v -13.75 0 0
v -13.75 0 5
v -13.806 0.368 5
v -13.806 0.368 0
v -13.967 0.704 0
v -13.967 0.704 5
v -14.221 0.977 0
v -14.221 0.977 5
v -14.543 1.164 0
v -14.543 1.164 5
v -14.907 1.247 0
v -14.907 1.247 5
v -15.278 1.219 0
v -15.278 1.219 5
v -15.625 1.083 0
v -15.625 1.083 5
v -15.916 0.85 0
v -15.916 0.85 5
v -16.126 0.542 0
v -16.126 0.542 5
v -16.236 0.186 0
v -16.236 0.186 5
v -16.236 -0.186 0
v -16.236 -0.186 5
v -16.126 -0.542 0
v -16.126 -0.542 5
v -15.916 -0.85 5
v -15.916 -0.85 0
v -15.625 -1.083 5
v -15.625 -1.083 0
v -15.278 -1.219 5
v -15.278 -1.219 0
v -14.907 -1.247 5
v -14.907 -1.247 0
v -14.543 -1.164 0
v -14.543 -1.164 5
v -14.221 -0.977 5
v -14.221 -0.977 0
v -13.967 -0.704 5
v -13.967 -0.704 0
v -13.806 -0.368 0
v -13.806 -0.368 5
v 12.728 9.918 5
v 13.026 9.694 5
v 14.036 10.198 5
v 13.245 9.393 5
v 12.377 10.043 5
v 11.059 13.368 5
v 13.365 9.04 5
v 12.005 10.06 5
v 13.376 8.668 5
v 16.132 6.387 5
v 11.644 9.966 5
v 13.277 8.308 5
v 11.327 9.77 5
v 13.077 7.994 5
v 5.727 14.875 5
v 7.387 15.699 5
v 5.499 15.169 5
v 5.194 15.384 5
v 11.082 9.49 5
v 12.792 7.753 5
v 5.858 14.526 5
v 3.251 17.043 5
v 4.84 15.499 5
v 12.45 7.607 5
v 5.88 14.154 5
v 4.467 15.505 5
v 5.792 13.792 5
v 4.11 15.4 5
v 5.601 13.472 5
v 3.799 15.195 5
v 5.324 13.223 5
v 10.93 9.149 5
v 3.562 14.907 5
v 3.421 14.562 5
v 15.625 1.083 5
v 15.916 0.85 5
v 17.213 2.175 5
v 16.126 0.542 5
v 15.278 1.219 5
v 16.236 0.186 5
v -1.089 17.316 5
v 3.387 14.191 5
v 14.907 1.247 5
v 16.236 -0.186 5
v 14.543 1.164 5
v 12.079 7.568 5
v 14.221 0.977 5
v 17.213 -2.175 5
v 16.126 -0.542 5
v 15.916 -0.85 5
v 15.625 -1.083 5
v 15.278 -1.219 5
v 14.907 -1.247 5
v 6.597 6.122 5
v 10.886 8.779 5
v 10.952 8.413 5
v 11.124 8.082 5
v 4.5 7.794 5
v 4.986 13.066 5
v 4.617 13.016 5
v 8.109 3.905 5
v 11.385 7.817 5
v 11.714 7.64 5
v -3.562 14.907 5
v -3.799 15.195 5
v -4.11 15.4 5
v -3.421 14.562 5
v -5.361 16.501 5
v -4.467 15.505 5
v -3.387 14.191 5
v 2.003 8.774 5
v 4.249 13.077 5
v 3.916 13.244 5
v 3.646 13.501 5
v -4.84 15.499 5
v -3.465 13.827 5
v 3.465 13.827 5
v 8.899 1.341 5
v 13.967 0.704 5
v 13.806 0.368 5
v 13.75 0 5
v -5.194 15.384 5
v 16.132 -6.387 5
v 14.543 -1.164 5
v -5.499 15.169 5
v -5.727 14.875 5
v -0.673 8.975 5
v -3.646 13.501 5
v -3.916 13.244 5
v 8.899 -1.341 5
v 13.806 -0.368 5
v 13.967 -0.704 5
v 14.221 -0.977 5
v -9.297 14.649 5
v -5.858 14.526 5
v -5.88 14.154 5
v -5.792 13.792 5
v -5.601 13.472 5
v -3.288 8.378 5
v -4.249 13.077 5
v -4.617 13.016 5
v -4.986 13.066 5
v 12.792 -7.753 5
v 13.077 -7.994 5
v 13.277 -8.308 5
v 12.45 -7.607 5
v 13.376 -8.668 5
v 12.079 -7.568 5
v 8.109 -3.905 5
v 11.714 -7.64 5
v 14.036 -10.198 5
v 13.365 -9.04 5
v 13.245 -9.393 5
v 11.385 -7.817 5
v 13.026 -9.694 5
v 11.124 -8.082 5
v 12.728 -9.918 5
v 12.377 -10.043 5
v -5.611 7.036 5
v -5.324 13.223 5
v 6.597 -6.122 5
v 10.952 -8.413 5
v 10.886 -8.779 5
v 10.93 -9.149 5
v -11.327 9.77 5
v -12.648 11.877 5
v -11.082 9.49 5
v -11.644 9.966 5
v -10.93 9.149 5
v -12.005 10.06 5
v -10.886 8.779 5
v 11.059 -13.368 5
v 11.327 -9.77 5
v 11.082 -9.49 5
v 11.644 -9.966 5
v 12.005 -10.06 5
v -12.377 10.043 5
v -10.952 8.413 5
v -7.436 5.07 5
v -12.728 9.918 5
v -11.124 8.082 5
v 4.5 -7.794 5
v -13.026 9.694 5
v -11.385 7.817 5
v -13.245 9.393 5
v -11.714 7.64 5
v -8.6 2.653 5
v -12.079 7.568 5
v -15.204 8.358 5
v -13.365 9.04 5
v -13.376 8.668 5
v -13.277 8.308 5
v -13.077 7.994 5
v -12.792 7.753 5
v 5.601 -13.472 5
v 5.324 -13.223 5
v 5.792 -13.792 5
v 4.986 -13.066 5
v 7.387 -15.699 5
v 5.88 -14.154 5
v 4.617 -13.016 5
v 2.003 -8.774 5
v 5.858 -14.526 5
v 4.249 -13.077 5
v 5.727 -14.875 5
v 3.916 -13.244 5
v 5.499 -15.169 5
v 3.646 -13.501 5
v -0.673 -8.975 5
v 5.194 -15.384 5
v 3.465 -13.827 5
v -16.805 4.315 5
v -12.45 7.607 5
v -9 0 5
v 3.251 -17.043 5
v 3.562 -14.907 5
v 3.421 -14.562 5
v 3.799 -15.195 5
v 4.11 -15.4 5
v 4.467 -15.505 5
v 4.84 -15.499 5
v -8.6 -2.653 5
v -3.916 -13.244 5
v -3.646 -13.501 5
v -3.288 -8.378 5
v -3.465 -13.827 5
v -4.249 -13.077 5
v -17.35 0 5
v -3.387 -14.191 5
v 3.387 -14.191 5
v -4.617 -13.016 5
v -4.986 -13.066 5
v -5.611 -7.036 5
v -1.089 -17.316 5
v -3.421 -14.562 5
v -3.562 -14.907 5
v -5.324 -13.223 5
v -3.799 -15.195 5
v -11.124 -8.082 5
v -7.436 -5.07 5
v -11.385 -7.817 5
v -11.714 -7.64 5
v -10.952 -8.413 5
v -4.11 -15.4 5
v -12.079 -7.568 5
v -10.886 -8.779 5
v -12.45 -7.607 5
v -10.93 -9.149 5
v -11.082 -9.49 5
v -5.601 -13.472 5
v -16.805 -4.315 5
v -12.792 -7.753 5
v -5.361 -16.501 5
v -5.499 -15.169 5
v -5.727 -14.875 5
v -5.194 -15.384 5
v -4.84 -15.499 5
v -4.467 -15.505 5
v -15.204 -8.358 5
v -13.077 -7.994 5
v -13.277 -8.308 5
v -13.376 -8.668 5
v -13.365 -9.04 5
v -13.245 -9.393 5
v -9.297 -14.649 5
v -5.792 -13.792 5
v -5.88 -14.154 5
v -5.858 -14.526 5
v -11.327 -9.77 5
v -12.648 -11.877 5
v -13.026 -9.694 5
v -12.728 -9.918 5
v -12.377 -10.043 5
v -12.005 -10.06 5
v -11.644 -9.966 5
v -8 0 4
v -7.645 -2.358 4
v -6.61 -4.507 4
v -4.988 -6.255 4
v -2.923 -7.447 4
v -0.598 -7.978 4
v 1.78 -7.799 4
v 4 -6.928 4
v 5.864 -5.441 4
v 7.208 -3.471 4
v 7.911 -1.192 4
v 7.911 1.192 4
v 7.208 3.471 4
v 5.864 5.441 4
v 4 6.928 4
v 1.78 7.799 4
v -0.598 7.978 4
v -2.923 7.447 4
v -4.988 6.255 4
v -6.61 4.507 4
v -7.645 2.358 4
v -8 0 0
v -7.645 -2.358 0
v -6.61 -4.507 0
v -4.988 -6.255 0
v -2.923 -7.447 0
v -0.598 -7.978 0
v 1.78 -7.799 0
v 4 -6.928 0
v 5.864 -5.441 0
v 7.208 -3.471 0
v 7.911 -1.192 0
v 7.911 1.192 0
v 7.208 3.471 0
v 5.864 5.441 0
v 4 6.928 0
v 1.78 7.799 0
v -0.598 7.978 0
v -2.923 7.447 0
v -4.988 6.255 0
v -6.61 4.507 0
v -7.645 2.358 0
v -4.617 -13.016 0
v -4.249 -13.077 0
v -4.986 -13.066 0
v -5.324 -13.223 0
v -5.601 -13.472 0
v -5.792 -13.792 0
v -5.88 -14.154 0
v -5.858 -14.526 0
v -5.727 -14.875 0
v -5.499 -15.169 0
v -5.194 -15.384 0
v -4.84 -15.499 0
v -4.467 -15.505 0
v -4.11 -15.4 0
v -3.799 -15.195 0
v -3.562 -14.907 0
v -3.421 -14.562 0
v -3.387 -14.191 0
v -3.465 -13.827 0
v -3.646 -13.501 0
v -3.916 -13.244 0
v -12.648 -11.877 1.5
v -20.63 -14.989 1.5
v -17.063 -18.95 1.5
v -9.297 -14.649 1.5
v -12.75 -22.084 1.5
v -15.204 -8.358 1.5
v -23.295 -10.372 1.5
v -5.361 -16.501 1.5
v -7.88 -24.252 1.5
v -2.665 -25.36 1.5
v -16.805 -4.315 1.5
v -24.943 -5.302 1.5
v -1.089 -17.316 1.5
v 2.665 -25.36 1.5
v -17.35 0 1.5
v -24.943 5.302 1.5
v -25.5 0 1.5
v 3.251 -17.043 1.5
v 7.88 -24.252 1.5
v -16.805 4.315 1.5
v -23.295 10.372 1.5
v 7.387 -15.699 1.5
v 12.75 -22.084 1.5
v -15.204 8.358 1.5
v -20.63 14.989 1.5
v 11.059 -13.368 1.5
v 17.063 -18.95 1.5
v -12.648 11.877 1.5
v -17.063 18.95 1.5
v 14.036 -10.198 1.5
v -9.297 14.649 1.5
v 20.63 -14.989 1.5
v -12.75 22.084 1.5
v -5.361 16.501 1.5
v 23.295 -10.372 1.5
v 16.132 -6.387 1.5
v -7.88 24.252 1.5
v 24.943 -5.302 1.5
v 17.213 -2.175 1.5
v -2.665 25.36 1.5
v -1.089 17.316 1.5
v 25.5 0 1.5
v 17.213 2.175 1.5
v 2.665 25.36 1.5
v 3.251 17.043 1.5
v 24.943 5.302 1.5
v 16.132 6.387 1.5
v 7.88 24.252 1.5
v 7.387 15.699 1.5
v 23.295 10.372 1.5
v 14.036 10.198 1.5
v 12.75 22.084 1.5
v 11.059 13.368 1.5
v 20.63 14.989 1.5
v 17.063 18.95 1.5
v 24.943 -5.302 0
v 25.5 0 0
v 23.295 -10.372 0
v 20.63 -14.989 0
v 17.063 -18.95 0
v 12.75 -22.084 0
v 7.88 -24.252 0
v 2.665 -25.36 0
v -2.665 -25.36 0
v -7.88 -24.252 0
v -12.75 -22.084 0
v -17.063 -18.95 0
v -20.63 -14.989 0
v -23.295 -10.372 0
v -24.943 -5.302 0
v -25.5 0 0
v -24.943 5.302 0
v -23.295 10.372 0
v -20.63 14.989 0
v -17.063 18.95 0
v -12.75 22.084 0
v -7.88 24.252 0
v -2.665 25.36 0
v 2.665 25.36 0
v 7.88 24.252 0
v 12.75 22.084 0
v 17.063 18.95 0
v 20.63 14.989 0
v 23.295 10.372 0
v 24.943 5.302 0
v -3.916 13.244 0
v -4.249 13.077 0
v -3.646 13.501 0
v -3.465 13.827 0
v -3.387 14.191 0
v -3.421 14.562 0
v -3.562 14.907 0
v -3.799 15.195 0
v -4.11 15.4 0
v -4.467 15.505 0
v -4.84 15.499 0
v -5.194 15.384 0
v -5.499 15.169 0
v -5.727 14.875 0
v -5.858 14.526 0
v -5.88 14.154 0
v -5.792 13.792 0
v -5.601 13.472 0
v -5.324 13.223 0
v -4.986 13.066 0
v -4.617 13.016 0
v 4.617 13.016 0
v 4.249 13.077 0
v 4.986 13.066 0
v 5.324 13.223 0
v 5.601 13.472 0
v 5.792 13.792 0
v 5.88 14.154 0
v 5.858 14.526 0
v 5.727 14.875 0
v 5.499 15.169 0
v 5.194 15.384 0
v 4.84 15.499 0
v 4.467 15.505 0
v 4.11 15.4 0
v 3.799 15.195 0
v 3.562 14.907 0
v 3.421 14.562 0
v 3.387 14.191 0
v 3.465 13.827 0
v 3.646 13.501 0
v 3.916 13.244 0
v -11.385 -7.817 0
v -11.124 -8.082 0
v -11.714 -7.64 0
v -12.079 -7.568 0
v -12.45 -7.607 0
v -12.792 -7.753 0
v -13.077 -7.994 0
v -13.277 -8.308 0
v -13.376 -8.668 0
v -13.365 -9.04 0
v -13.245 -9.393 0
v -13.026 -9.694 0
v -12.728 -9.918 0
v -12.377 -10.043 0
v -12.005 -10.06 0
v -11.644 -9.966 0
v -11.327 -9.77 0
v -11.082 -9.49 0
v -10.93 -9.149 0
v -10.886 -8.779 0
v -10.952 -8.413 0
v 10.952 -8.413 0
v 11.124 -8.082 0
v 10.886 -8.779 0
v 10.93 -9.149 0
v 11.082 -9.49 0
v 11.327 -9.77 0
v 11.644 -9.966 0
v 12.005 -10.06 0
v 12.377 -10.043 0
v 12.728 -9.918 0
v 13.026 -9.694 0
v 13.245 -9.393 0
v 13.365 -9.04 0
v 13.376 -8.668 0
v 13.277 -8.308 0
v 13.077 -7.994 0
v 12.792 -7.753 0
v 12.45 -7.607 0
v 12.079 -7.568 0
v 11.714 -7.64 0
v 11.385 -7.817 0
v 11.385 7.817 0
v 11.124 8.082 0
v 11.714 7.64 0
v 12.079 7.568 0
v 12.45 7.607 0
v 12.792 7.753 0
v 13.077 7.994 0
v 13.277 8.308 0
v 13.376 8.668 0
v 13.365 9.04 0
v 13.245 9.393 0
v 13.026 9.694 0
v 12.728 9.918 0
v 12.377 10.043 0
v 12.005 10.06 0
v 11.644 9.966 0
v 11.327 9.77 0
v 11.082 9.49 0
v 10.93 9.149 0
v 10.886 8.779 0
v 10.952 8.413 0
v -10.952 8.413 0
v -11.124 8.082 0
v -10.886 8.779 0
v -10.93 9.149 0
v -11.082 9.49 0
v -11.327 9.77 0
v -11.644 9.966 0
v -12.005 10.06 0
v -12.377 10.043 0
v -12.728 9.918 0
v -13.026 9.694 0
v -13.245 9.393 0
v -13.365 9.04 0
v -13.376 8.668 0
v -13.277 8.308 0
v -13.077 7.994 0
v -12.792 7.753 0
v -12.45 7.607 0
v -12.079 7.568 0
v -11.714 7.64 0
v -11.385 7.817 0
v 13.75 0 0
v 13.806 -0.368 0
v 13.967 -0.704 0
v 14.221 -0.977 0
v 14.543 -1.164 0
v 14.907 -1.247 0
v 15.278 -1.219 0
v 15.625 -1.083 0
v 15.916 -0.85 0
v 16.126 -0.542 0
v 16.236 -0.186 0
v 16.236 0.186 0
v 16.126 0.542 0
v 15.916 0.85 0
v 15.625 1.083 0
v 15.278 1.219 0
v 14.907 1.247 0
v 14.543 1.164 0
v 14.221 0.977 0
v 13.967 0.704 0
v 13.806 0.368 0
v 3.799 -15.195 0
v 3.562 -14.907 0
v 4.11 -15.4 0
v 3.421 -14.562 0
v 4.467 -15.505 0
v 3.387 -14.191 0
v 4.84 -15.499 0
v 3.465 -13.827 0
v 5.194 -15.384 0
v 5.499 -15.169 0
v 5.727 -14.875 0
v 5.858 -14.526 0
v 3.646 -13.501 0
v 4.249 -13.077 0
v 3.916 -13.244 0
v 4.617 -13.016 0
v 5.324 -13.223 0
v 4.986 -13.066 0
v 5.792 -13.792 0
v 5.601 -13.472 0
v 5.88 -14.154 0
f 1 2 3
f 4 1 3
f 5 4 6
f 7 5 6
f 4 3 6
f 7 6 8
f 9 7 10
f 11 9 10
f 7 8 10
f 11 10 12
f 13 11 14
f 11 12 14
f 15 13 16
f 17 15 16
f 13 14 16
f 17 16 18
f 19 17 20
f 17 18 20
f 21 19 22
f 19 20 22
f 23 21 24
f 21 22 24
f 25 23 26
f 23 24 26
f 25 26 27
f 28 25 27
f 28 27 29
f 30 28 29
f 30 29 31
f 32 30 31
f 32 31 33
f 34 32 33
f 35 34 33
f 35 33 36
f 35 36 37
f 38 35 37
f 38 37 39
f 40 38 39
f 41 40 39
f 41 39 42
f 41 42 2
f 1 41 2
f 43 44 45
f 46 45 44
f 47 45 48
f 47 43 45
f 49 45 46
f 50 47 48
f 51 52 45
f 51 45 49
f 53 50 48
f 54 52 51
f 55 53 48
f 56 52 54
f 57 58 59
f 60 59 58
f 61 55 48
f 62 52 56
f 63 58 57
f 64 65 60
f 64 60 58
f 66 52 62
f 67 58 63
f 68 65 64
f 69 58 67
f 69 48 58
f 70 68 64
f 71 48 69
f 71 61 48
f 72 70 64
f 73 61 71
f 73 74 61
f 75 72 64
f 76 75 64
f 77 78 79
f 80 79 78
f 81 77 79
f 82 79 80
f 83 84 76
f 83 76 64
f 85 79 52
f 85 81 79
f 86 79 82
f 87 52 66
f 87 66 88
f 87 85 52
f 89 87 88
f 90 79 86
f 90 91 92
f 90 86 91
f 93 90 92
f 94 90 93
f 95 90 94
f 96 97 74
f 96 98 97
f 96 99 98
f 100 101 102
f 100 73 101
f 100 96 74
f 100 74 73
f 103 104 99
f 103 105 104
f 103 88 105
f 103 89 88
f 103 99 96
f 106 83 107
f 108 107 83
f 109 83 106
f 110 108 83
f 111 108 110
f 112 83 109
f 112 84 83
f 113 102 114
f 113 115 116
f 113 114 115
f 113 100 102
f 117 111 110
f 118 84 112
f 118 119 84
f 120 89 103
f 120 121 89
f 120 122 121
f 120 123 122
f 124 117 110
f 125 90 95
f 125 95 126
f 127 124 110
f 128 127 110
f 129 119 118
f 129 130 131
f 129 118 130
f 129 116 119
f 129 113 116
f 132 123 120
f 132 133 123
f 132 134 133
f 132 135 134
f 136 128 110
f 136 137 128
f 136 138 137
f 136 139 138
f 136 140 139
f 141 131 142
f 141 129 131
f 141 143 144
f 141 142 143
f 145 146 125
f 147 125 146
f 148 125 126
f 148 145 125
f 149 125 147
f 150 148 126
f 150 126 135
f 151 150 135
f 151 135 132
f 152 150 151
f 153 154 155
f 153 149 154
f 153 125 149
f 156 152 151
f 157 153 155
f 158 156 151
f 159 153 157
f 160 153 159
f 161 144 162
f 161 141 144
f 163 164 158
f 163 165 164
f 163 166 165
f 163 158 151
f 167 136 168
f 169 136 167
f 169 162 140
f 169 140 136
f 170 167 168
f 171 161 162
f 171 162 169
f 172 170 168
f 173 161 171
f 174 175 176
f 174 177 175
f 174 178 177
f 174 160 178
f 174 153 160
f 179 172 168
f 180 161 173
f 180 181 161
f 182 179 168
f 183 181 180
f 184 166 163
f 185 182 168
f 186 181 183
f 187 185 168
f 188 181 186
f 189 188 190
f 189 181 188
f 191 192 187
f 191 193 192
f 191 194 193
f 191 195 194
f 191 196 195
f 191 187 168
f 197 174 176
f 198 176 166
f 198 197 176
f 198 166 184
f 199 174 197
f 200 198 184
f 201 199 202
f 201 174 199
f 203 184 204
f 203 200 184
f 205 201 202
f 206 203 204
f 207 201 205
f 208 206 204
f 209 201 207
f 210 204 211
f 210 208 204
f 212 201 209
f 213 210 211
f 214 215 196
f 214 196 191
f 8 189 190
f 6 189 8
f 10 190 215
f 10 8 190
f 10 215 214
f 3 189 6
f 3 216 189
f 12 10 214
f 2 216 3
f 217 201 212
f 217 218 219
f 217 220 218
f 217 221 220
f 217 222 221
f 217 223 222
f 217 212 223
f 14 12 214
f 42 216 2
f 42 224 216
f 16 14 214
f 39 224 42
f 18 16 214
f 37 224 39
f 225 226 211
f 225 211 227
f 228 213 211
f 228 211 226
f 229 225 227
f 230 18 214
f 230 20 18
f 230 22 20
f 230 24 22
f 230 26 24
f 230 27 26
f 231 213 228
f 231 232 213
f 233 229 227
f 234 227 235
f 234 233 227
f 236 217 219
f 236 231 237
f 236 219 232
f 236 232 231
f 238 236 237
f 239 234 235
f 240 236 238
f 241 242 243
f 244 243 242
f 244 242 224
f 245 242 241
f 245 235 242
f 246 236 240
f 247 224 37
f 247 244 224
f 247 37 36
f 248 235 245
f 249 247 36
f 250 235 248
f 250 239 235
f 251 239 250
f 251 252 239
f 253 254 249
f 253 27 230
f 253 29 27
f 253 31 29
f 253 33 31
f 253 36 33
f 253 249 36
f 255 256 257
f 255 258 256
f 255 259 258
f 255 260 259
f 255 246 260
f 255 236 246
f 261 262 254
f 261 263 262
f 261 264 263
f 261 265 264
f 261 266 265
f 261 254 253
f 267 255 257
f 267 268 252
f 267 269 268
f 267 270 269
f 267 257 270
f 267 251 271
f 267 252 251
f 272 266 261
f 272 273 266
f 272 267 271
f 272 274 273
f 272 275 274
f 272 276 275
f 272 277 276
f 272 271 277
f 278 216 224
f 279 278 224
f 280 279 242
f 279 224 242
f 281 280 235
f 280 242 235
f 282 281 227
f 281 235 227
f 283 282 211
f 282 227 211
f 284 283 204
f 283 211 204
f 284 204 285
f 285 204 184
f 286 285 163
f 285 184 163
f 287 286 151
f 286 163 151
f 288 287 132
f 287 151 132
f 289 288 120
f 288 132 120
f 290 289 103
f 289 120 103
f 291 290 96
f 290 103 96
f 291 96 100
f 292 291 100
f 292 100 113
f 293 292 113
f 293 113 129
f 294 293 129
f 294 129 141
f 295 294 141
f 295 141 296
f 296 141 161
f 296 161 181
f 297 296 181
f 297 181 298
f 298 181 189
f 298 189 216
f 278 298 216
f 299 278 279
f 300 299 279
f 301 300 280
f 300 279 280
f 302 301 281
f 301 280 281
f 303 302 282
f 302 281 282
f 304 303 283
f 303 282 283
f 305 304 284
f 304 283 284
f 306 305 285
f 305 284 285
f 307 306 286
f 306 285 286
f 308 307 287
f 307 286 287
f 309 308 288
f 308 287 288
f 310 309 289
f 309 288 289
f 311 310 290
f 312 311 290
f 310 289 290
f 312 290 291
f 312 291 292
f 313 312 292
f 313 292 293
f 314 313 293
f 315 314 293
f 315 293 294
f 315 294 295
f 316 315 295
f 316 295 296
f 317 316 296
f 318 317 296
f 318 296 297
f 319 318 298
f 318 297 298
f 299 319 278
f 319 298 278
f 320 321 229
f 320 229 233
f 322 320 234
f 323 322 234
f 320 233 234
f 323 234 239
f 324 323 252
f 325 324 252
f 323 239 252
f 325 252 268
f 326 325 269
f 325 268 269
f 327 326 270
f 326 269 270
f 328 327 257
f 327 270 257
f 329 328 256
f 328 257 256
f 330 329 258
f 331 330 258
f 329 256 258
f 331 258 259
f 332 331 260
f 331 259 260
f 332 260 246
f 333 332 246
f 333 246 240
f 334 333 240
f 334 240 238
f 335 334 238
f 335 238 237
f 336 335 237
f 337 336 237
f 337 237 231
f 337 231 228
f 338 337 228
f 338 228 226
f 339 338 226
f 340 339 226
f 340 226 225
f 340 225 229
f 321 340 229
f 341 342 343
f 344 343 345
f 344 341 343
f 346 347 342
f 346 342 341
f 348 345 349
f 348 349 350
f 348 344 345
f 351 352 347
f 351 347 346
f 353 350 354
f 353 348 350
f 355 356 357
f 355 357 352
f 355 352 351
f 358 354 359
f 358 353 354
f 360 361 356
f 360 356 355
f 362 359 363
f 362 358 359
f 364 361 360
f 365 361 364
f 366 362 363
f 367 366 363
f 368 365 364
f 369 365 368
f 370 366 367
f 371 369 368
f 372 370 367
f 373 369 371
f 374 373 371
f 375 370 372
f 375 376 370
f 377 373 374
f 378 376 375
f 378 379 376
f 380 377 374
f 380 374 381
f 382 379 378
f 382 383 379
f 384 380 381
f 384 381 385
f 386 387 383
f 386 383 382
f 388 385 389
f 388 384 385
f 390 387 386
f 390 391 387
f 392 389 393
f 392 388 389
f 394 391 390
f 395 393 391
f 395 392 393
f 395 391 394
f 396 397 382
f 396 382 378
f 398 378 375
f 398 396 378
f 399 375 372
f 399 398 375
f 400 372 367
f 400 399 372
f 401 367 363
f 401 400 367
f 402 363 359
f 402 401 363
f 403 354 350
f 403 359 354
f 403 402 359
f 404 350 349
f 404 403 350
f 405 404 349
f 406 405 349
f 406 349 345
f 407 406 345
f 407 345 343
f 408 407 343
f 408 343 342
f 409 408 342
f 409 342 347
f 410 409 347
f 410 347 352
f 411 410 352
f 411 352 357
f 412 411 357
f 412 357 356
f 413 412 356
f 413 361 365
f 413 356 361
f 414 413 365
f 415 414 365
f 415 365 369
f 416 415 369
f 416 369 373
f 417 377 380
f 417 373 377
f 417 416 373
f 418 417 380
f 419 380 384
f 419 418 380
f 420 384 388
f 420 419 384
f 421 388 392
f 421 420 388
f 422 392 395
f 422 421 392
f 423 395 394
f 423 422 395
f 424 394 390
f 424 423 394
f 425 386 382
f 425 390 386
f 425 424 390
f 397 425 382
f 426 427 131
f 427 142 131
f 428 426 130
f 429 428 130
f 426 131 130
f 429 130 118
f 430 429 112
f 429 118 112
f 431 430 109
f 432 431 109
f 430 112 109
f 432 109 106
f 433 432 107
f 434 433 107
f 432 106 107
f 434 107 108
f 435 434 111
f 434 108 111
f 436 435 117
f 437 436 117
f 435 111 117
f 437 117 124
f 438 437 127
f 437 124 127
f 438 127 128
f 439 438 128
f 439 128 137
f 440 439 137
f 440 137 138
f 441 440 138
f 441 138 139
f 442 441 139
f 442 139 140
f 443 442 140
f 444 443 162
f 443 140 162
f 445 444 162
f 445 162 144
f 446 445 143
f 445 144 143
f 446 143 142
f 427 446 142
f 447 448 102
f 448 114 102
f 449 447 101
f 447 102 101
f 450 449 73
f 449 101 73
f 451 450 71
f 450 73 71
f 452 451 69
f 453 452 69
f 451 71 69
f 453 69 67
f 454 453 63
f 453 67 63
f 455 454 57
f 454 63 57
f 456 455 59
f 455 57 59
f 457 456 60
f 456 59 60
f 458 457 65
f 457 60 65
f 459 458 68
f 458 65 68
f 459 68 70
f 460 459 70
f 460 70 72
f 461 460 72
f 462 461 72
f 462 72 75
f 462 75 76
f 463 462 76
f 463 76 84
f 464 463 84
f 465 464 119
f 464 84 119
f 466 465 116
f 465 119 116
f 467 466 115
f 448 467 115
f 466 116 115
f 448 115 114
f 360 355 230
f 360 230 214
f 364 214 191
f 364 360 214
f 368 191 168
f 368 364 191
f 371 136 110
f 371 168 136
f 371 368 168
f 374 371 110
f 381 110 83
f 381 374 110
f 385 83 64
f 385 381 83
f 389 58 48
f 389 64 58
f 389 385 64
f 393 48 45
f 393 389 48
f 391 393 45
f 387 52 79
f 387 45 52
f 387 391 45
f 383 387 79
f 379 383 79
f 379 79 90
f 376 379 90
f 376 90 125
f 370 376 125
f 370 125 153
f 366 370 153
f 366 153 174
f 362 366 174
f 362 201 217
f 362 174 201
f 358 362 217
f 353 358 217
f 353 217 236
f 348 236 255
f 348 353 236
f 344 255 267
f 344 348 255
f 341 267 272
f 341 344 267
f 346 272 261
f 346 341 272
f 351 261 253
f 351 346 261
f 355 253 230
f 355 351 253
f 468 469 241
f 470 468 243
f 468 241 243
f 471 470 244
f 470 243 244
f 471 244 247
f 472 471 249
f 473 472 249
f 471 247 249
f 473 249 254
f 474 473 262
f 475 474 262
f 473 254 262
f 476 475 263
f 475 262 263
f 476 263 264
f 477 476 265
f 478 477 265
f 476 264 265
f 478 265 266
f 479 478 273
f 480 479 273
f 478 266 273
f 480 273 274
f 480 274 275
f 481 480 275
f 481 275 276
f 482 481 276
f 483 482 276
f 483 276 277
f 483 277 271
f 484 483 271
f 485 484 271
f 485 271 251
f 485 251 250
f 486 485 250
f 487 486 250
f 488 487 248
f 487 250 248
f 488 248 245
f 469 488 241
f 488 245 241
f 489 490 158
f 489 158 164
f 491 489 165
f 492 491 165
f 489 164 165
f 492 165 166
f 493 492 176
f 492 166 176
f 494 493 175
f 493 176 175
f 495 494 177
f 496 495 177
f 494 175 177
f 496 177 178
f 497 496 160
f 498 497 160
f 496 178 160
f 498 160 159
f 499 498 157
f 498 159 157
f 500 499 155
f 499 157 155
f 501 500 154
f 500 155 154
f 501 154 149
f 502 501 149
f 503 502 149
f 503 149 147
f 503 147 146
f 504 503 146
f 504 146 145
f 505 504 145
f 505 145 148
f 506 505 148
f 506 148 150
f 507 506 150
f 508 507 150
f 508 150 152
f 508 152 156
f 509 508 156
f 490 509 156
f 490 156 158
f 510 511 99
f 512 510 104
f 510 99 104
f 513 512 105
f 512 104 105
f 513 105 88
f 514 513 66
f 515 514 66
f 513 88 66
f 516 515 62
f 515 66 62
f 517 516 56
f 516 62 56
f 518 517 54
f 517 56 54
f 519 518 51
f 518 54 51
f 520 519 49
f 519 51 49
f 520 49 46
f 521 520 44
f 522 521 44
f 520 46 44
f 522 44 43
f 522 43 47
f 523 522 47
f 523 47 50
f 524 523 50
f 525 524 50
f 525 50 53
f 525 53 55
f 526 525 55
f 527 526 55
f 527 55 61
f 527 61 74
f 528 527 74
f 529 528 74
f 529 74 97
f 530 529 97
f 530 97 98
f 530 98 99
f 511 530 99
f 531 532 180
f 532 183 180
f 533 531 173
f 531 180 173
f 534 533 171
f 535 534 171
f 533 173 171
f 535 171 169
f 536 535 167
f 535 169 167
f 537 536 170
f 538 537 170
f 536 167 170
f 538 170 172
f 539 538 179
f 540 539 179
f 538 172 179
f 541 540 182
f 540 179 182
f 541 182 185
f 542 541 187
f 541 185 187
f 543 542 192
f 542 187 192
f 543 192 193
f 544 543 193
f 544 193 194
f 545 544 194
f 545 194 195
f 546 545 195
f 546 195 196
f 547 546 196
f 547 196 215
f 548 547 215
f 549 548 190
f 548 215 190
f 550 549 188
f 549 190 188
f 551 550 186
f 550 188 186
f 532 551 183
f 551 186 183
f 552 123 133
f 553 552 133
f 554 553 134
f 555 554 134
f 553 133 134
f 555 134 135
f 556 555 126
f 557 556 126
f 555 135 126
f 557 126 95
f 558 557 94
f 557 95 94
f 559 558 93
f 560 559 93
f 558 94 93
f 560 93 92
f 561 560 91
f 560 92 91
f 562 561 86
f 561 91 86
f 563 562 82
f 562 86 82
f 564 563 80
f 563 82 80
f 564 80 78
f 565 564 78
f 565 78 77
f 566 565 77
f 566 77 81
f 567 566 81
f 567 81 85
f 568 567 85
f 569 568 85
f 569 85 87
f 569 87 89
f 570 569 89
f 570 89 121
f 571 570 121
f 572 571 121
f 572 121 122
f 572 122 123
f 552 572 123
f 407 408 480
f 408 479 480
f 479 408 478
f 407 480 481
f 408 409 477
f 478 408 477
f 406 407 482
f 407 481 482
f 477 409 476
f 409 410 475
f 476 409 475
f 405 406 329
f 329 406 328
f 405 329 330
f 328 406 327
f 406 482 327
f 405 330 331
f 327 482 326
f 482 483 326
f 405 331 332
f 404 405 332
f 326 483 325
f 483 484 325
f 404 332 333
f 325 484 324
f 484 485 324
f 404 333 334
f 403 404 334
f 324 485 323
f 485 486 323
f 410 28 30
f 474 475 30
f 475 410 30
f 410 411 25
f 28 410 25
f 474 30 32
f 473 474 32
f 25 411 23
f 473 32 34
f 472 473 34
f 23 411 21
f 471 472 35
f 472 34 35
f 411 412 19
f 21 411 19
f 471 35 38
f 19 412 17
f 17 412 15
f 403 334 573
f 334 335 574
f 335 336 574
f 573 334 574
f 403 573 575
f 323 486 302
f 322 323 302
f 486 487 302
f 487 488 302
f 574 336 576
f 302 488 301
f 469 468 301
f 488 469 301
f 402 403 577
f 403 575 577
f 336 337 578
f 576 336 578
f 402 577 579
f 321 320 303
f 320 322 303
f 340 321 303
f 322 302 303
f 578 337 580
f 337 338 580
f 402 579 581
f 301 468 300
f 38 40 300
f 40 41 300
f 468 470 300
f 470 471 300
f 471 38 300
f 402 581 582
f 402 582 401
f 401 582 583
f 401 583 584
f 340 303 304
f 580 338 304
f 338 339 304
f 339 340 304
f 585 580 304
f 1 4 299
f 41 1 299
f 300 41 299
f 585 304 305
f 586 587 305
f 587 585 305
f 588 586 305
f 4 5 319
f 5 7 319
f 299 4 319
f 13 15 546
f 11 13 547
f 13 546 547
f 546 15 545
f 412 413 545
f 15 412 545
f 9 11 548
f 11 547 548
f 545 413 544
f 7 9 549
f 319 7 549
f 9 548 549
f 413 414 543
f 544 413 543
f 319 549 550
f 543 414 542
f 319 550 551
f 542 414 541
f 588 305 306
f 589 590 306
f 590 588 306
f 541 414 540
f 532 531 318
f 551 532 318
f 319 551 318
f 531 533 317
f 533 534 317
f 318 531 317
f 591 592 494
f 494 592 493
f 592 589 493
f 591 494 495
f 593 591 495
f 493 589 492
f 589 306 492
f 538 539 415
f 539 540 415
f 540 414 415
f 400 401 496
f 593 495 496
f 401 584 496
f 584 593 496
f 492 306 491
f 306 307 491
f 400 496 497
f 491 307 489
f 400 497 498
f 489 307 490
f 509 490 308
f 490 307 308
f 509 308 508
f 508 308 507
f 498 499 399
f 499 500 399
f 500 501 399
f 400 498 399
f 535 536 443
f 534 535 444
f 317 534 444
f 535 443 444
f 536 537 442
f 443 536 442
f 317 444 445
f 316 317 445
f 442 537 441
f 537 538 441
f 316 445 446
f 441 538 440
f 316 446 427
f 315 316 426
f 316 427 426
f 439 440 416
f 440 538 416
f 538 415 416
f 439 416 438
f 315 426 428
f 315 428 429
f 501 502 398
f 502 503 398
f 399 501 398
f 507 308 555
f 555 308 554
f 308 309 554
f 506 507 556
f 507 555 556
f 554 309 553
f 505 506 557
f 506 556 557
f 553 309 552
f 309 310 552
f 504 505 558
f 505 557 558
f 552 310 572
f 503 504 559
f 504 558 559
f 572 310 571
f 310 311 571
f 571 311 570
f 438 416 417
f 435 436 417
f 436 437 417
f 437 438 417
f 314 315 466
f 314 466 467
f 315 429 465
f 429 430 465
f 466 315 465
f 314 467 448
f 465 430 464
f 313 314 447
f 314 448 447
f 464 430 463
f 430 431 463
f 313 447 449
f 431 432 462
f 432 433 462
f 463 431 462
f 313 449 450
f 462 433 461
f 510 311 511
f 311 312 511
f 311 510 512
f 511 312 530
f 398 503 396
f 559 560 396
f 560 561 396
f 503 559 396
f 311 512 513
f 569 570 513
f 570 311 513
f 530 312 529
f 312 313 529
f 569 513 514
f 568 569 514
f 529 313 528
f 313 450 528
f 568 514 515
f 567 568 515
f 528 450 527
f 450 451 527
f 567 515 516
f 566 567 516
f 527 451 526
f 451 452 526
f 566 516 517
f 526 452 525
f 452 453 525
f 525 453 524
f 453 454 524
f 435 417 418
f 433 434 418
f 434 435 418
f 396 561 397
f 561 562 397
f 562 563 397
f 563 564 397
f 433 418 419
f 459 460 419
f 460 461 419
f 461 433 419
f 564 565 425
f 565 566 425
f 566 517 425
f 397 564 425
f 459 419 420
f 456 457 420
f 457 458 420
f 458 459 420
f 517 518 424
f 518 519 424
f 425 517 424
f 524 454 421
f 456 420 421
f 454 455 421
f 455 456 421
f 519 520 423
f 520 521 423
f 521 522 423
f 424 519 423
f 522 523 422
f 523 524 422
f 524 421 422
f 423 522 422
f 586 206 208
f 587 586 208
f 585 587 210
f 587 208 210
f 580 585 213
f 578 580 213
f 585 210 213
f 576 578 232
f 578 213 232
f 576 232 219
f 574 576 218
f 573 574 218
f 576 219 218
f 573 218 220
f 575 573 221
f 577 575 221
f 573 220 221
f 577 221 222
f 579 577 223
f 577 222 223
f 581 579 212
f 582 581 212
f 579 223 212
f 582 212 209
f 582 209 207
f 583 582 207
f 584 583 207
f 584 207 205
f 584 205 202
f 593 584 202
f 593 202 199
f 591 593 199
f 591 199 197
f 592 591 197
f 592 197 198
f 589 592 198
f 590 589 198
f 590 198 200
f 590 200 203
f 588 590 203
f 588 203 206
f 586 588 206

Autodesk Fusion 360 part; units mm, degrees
sketch "Sketch1" plane through (0, 0, 0) normal (0, 0, 1) x (1, 0, 0)
  circle A0 centre (0, 0) radius 25.5
  dimension "d1" = 51
extrude "Extrude1" add sketch "Sketch1" along normal blind 1.5
sketch "Sketch2" plane through (0, 0, 1.5) normal (0, 0, 1) x (-1, 0, 0)
  circle A0 centre (0, 0) radius 25.5
  circle A1 centre (0, 0) radius 17.35
  dimension "d4" = 34.7
extrude "Extrude2" add sketch "Sketch2" along normal blind 3.5 contours A1
sketch "Sketch3" plane through (0, 0, 5) normal (0, 0, 1) x (-1, 0, 0)
  circle A0 centre (0, 0) radius 17.35
  circle A1 centre (-15, 0) radius 1.25
  dimension "d8" = 2.5
  dimension "d9" = 15
extrude "Extrude3" cut sketch "Sketch3" against normal blind 20 contours A1
pattern_circular "C-Pattern1" count 10 over 360 about axis through (0, 0, 1.75) along (0, 0, 1) of "Extrude3"
sketch "Sketch4" plane through (0, 0, 5) normal (0, 0, 1) x (-1, 0, 0)
  circle A0 centre (-12.1353, 8.8168) radius 1.25
  circle A1 centre (-4.6353, 14.2658) radius 1.25
  circle A2 centre (4.6353, 14.2658) radius 1.25
  circle A3 centre (12.1353, 8.8168) radius 1.25
  circle A4 centre (15, 0) radius 1.25
  circle A5 centre (12.1353, -8.8168) radius 1.25
  circle A6 centre (4.6353, -14.2658) radius 1.25
  circle A7 centre (-4.6353, -14.2658) radius 1.25
  circle A8 centre (-12.1353, -8.8168) radius 1.25
  circle A9 centre (-15, 0) radius 1.25
  circle A10 centre (0, 0) radius 17.35
  circle A11 centre (0, 0) radius 8
  dimension "d14" = 16
extrude "Extrude4" cut sketch "Sketch4" against normal blind 20 contours A11
chamfer "Chamfer1" distance 1 angle 45 1 edges at (7.4586, -2.8929, 5)
sketch "Sketch5" plane through (0, 0, 5) normal (0, 0, 1) x (-1, 0, 0)
  circle A0 centre (0, 0) radius 17.35
  circle A1 centre (-15, 0) radius 1.25
  circle A2 centre (-12.1353, -8.8168) radius 1.25
  circle A3 centre (-4.6353, -14.2658) radius 1.25
  circle A4 centre (4.6353, -14.2658) radius 1.25
  circle A5 centre (12.1353, -8.8168) radius 1.25
  circle A6 centre (15, 0) radius 1.25
  circle A7 centre (12.1353, 8.8168) radius 1.25
  circle A8 centre (4.6353, 14.2658) radius 1.25
  circle A9 centre (-4.6353, 14.2658) radius 1.25
  circle A10 centre (-12.1353, 8.8168) radius 1.25
  circle A11 centre (0, 0) radius 9
equation "d4 = 35 mm - offset"
equation "offset = 0.3 mm"
